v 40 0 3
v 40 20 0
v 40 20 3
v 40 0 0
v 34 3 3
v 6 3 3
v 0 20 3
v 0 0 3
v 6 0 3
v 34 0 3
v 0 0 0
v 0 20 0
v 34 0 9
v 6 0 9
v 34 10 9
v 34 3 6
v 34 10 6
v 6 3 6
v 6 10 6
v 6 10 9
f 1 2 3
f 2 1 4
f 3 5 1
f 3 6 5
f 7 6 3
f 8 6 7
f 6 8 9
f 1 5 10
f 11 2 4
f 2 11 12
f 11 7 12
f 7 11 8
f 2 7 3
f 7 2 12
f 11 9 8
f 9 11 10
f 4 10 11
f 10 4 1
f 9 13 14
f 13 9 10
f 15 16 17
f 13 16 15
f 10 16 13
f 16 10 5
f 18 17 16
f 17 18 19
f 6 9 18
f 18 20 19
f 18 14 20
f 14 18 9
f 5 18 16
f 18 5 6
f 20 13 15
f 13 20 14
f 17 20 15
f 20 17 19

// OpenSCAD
//hook for suspending case of screwdriver bits

$fn =35;

union(){
    cube([40,20,3]);
    
    translate([6,0,0]) cube([28,3,6]);
    
    translate([6,0,6]) cube([28,10,3]);
    }
